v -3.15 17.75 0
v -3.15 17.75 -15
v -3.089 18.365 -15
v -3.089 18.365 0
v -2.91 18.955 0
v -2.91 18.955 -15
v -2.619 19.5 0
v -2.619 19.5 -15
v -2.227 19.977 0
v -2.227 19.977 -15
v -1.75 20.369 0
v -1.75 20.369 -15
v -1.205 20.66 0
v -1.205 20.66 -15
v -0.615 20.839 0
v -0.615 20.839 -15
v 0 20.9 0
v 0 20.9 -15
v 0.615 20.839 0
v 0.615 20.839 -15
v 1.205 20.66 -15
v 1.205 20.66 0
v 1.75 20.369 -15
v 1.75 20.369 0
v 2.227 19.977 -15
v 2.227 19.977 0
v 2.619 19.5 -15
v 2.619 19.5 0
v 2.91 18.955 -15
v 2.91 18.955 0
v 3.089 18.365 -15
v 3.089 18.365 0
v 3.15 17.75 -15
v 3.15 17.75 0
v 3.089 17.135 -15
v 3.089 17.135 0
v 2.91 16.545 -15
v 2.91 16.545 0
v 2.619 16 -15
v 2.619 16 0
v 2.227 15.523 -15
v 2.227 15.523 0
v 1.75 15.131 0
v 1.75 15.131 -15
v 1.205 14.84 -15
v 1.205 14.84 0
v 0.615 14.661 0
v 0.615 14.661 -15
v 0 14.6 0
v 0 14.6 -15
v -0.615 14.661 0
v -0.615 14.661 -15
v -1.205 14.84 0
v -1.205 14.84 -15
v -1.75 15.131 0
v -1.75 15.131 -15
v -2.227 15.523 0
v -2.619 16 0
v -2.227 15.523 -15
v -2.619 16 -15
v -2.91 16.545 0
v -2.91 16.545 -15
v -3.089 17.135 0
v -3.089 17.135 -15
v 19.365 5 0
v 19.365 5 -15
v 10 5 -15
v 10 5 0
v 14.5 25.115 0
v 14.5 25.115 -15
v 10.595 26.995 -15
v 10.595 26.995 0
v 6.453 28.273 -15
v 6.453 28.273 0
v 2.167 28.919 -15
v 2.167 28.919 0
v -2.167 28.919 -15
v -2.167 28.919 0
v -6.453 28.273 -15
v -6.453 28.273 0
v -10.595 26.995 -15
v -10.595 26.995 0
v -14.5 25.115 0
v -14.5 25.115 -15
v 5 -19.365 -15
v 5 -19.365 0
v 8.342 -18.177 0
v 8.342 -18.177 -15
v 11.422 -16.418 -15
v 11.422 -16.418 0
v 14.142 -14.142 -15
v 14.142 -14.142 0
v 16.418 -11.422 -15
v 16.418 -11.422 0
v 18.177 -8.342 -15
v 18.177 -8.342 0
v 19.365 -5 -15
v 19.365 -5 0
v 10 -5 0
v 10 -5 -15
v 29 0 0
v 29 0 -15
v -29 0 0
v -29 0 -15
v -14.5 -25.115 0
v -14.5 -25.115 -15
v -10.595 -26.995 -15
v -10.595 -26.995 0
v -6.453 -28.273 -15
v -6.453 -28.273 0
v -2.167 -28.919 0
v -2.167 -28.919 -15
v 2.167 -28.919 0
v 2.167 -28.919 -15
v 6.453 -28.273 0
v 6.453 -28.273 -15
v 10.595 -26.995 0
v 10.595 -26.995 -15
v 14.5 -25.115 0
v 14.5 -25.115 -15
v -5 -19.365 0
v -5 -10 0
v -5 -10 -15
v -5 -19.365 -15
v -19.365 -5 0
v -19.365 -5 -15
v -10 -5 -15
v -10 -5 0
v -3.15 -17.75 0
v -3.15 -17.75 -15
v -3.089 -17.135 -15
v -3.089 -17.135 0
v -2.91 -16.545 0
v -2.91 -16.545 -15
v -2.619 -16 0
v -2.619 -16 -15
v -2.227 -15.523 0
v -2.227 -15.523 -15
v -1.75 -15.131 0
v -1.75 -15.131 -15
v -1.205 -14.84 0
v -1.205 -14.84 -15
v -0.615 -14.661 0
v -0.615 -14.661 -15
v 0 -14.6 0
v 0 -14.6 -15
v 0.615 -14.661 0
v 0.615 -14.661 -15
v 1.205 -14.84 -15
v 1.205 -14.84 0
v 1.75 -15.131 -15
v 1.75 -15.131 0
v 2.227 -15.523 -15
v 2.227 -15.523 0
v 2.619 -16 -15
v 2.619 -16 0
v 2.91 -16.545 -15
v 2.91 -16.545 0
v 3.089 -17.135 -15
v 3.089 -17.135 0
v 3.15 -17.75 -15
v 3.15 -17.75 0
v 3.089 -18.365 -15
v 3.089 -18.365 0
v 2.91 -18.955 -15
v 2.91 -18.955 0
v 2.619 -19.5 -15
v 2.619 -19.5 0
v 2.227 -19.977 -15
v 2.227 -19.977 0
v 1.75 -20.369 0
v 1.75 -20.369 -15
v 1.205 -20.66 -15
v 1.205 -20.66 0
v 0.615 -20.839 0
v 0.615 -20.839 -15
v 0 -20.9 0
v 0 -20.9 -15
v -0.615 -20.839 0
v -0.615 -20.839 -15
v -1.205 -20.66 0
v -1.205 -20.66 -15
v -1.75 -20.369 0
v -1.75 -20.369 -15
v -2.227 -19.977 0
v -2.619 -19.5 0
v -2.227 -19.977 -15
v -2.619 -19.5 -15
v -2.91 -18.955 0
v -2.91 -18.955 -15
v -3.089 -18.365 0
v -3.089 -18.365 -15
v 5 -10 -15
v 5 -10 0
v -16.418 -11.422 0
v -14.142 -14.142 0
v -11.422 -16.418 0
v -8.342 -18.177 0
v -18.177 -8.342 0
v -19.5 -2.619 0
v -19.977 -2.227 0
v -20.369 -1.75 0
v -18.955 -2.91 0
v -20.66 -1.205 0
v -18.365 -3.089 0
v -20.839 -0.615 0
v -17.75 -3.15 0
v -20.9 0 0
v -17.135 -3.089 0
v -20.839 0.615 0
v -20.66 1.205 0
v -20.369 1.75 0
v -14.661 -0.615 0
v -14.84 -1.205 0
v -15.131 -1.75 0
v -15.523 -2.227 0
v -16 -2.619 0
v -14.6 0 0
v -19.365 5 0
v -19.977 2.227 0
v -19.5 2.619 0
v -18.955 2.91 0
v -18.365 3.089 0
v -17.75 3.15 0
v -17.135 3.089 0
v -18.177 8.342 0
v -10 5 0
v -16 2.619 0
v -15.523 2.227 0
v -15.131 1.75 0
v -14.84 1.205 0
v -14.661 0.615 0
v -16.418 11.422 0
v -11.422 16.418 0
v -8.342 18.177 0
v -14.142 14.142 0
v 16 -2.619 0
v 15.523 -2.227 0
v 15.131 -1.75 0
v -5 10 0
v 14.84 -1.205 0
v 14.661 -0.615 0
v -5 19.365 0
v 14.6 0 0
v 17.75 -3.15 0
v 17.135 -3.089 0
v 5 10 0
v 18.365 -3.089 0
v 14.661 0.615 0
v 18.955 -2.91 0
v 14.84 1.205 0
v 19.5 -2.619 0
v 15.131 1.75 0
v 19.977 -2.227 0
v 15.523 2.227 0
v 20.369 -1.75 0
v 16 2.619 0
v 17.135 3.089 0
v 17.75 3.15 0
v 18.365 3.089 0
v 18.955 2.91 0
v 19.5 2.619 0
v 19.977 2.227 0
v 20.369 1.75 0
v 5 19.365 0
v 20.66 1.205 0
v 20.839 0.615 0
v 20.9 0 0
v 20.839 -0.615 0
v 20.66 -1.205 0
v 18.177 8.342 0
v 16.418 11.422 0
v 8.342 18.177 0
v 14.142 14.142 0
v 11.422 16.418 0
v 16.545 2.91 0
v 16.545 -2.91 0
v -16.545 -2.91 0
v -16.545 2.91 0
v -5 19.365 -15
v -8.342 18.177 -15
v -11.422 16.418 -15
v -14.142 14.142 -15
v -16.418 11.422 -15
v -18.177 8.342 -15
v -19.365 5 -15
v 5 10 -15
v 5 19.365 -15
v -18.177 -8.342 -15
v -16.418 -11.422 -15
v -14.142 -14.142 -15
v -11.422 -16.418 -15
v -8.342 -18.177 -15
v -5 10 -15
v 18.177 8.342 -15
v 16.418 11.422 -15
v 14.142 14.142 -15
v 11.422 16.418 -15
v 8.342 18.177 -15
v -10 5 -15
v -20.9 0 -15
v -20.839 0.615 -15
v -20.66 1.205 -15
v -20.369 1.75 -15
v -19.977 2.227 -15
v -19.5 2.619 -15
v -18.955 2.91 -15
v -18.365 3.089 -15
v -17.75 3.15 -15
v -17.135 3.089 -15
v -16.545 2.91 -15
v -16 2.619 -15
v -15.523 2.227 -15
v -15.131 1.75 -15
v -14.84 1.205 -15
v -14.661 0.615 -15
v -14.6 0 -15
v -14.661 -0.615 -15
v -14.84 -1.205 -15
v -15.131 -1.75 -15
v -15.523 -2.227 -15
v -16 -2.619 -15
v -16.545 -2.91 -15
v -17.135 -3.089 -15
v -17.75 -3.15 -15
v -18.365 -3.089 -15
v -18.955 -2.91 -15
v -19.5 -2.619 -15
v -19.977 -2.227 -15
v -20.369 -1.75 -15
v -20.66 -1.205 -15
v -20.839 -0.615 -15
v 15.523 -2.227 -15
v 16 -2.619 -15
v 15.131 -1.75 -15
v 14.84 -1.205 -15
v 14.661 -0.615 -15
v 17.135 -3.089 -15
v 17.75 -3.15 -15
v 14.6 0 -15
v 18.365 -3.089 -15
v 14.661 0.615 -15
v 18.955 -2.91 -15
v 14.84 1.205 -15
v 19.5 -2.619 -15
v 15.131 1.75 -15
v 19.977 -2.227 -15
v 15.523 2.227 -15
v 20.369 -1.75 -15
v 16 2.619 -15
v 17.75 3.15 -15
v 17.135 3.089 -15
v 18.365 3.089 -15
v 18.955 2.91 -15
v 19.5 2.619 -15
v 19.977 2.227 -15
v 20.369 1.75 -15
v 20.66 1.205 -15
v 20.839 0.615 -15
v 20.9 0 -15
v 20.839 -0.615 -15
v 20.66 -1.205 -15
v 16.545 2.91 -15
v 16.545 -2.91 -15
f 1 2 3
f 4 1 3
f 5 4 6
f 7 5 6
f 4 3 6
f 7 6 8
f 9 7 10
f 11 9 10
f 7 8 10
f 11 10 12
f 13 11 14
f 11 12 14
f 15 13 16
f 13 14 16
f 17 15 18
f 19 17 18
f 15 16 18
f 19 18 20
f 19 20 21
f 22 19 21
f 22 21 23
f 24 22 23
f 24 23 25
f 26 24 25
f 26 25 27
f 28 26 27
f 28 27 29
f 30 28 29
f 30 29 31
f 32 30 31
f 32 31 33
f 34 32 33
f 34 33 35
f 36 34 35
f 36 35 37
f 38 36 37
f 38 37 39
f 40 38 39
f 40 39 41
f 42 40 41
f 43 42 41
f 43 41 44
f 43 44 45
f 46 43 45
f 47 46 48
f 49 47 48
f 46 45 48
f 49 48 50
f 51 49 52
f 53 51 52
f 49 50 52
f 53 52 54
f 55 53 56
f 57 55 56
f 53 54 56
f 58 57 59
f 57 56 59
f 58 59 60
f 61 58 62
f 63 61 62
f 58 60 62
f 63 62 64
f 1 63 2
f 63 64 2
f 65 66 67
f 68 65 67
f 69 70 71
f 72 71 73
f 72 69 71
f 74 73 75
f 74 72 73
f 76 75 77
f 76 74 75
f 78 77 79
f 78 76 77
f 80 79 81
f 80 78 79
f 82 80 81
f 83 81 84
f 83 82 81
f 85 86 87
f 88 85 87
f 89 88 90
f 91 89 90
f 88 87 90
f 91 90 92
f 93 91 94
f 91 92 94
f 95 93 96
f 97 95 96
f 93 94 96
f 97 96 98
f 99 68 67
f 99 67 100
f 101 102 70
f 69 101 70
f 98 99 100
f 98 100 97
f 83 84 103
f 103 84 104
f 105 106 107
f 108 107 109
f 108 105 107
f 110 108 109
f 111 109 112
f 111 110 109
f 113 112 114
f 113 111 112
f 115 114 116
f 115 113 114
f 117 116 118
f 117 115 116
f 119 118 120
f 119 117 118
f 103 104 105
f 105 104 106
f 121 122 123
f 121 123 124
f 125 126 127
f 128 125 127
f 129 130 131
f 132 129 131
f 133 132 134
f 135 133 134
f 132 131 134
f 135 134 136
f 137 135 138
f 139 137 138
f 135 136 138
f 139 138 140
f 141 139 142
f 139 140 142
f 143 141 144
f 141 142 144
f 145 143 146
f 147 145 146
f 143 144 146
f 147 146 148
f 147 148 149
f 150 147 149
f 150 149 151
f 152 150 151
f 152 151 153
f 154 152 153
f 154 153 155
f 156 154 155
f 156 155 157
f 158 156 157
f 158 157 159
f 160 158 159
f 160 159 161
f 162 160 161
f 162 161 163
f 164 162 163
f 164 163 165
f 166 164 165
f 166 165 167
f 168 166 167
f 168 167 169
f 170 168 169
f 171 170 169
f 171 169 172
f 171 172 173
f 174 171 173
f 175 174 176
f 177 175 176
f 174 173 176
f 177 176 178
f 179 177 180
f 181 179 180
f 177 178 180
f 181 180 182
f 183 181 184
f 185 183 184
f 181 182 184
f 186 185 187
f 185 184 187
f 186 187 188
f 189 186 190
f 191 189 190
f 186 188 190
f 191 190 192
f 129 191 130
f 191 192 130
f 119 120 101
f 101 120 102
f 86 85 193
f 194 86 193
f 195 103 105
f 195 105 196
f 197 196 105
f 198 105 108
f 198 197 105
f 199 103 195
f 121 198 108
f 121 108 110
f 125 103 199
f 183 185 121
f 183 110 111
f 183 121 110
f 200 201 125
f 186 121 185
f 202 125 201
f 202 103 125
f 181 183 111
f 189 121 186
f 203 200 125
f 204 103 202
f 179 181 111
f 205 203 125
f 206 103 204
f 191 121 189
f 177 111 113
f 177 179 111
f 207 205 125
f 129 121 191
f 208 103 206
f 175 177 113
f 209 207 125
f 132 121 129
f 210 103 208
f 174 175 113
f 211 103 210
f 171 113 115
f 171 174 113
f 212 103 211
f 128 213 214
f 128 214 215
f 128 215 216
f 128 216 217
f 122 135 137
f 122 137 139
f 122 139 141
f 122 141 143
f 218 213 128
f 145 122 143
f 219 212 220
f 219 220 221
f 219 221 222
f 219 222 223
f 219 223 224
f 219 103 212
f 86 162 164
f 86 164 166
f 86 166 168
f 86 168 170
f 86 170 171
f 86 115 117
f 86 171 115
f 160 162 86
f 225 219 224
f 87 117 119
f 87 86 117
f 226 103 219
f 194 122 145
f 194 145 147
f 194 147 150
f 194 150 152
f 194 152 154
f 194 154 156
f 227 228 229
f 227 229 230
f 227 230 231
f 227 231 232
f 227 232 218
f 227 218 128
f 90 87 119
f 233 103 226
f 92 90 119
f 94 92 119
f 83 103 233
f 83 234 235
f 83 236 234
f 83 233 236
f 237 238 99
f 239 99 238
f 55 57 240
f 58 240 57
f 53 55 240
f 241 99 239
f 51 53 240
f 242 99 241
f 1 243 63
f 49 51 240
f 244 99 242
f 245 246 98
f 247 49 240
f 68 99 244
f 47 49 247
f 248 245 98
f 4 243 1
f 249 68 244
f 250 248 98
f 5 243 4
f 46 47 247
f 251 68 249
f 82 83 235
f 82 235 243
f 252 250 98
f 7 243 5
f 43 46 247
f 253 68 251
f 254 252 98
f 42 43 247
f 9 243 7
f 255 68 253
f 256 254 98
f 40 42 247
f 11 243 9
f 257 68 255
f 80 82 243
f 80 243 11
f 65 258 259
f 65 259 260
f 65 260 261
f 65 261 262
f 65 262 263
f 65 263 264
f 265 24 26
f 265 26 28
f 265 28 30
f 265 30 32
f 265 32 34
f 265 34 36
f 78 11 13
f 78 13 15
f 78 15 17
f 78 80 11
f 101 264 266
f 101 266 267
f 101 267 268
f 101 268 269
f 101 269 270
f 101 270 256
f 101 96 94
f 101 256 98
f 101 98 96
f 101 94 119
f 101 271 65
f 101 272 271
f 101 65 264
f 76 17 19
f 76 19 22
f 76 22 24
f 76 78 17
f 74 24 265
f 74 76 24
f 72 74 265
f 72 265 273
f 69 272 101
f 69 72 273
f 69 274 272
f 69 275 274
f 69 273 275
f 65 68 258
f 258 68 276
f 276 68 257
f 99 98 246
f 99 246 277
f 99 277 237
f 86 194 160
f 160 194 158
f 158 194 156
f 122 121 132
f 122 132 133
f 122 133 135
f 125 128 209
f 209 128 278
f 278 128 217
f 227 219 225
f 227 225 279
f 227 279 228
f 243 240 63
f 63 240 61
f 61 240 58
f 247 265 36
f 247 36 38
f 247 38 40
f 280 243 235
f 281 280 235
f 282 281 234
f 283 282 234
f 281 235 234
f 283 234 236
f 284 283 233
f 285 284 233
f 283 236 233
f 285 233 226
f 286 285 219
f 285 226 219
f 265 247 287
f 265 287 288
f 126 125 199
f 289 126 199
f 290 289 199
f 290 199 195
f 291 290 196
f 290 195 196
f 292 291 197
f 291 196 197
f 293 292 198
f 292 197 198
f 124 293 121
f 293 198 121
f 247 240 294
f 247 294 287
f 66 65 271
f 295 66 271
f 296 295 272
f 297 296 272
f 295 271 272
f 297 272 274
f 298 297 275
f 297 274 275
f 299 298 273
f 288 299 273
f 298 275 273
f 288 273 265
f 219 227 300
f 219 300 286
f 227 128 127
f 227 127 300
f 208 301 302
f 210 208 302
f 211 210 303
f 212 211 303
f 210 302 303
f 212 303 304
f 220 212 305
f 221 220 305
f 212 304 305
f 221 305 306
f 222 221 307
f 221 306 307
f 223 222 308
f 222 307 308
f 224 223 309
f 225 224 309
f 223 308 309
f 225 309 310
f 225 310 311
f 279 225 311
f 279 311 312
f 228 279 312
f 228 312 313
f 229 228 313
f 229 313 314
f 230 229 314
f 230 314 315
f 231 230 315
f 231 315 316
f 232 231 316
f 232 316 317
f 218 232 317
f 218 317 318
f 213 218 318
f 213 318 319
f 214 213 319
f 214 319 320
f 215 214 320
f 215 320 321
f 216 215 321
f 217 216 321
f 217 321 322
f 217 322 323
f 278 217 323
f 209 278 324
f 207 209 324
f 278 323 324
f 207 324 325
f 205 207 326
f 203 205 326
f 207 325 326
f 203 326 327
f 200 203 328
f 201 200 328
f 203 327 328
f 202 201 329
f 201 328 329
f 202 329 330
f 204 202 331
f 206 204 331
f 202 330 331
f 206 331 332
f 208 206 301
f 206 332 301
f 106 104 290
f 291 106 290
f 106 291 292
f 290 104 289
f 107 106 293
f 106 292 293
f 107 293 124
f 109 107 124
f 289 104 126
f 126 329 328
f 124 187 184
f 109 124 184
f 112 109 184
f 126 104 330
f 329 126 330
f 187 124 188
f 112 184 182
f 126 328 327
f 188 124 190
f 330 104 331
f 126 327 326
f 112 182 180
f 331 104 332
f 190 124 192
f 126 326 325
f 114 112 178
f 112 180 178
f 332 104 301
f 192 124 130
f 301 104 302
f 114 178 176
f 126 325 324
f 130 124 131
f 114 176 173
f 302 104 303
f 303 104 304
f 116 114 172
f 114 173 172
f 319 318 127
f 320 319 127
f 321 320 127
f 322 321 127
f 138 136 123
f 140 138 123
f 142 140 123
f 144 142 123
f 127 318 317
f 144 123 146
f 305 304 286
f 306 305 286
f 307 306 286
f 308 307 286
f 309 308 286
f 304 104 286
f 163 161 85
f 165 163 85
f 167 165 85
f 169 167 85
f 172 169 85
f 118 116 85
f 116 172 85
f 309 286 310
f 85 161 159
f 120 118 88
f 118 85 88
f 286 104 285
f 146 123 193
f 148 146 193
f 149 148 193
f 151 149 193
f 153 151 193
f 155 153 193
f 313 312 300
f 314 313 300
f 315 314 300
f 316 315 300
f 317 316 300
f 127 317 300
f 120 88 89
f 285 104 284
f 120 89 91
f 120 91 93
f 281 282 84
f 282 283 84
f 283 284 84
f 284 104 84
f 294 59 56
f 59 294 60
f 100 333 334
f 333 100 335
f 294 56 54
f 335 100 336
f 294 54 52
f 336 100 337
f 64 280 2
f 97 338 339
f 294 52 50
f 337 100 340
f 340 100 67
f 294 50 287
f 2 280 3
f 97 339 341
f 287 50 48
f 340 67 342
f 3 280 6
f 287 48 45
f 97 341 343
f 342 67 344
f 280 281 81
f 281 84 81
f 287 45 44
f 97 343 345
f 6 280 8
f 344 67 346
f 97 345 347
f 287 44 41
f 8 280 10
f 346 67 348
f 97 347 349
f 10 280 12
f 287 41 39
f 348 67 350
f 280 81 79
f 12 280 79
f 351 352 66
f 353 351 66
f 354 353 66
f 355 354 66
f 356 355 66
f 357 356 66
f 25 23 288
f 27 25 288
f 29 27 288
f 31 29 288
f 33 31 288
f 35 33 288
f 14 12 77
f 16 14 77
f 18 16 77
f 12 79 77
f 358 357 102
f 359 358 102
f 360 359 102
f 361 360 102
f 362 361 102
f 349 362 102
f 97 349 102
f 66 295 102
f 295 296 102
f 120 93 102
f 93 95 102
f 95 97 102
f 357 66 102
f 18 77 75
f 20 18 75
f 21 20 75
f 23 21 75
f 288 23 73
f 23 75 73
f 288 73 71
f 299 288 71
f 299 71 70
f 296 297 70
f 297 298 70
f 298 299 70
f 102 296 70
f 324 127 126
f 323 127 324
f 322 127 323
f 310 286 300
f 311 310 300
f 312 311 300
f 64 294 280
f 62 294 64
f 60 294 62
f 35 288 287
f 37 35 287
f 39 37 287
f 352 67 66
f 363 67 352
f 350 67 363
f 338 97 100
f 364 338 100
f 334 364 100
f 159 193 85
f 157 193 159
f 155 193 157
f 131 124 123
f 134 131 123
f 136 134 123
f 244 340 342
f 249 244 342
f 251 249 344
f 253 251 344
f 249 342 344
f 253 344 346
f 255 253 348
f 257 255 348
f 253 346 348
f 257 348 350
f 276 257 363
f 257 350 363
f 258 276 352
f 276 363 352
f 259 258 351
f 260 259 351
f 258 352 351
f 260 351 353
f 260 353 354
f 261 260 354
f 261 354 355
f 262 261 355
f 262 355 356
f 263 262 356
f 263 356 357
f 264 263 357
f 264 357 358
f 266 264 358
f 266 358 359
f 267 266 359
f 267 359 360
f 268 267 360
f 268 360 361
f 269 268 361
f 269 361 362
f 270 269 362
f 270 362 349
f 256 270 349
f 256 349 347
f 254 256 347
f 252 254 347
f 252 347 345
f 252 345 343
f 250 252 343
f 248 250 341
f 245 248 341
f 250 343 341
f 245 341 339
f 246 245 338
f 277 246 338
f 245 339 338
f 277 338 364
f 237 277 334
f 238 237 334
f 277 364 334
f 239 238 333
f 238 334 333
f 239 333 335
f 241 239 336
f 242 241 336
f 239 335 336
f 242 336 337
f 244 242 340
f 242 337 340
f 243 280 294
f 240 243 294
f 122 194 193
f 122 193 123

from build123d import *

# Parameters (mm, degrees)
SKETCH6_R                 = 29
SKETCH6_R_2               = 20
INNER_RING_DEPTH          = 15
MOTOR_CONNECTOR_CUT_DEPTH = 15
CUT_EXTRUDE1_DEPTH        = 16
CUT_EXTRUDE1_DEPTH_BACK   = 27
SKETCH10_R                = 3.15
CUT_EXTRUDE2_DEPTH        = 55
CUT_EXTRUDE2_DEPTH_BACK   = 70


with BuildPart() as part:
    # Sketch6 → Inner Ring (new body)
    with BuildSketch(Plane.XY):
        Circle(SKETCH6_R)
        Circle(SKETCH6_R_2, mode=Mode.SUBTRACT)
    extrude(amount=-INNER_RING_DEPTH)

    # Sketch7 → Motor Connector Cut (add)
    with BuildSketch(Plane.XY):
        with BuildLine():
            ThreePointArc((20, 0), (19.840593925, 2.52008585), (19.364916731, 5))
            Line((19.364916731, 5), (9.999996731, 5))
            Line((9.999996731, 5), (9.999996731, -5))
            Line((9.999996731, -5), (19.364916731, -5))
            ThreePointArc((19.364916731, -5), (19.840593925, -2.52008585), (20, 0))
        make_face()
        with BuildLine():
            ThreePointArc((5, 19.364916731), (0, 20), (-5, 19.364916731))
            Line((-5, 19.364916731), (-5, 9.999996731))
            Line((-5, 9.999996731), (5, 9.999996731))
            Line((5, 9.999996731), (5, 19.364916731))
        make_face()
        with BuildLine():
            Line((-9.999996731, -5), (-9.999996731, 5))
            Line((-9.999996731, 5), (-19.364916731, 5))
            ThreePointArc((-19.364916731, 5), (-20, 0), (-19.364916731, -5))
            Line((-19.364916731, -5), (-9.999996731, -5))
        make_face()
        with BuildLine():
            Line((-5, -9.999996731), (-5, -19.364916731))
            ThreePointArc((-5, -19.364916731), (0, -20), (5, -19.364916731))
            Line((5, -19.364916731), (5, -9.999996731))
            Line((5, -9.999996731), (-5, -9.999996731))
        make_face()
    extrude(amount=-MOTOR_CONNECTOR_CUT_DEPTH)

    # Sketch9 → Cut-Extrude1 (cut, two sides)
    with BuildSketch(Plane(origin=(0, 0, -15), x_dir=(-1, 0, 0), z_dir=(0, 0, -1))) as cut_extrude1_sk:
        with BuildLine():
            Line((14.5, 25.11473671), (29, 0))
            ThreePointArc((29, 0), (25.11473671, 14.5), (14.5, 25.11473671))
        make_face()
        with BuildLine():
            Line((-29, 0), (-14.5, 25.11473671))
            ThreePointArc((-14.5, 25.11473671), (-25.11473671, 14.5), (-29, 0))
        make_face()
        with BuildLine():
            ThreePointArc((-29, 0), (-25.11473671, -14.5), (-14.5, -25.11473671))
            Line((-14.5, -25.11473671), (-29, 0))
        make_face()
        with BuildLine():
            ThreePointArc((14.5, -25.11473671), (25.11473671, -14.5), (29, 0))
            Line((29, 0), (14.5, -25.11473671))
        make_face()
    extrude(amount=CUT_EXTRUDE1_DEPTH, mode=Mode.SUBTRACT)
    extrude(cut_extrude1_sk.sketch, amount=-CUT_EXTRUDE1_DEPTH_BACK, mode=Mode.SUBTRACT)

    # Sketch10 → Cut-Extrude2 (cut, two sides)
    with BuildSketch(Plane(origin=(0, 0, -15), x_dir=(-1, 0, 0), z_dir=(0, 0, -1))) as cut_extrude2_sk:
        with Locations((-17.75, 0)):
            Circle(SKETCH10_R)
        with Locations((0, 17.75)):
            Circle(SKETCH10_R)
        with Locations((17.75, 0)):
            Circle(SKETCH10_R)
        with Locations((0, -17.75)):
            Circle(SKETCH10_R)
    extrude(amount=CUT_EXTRUDE2_DEPTH, mode=Mode.SUBTRACT)
    extrude(cut_extrude2_sk.sketch, amount=-CUT_EXTRUDE2_DEPTH_BACK, mode=Mode.SUBTRACT)


solid = part.part
